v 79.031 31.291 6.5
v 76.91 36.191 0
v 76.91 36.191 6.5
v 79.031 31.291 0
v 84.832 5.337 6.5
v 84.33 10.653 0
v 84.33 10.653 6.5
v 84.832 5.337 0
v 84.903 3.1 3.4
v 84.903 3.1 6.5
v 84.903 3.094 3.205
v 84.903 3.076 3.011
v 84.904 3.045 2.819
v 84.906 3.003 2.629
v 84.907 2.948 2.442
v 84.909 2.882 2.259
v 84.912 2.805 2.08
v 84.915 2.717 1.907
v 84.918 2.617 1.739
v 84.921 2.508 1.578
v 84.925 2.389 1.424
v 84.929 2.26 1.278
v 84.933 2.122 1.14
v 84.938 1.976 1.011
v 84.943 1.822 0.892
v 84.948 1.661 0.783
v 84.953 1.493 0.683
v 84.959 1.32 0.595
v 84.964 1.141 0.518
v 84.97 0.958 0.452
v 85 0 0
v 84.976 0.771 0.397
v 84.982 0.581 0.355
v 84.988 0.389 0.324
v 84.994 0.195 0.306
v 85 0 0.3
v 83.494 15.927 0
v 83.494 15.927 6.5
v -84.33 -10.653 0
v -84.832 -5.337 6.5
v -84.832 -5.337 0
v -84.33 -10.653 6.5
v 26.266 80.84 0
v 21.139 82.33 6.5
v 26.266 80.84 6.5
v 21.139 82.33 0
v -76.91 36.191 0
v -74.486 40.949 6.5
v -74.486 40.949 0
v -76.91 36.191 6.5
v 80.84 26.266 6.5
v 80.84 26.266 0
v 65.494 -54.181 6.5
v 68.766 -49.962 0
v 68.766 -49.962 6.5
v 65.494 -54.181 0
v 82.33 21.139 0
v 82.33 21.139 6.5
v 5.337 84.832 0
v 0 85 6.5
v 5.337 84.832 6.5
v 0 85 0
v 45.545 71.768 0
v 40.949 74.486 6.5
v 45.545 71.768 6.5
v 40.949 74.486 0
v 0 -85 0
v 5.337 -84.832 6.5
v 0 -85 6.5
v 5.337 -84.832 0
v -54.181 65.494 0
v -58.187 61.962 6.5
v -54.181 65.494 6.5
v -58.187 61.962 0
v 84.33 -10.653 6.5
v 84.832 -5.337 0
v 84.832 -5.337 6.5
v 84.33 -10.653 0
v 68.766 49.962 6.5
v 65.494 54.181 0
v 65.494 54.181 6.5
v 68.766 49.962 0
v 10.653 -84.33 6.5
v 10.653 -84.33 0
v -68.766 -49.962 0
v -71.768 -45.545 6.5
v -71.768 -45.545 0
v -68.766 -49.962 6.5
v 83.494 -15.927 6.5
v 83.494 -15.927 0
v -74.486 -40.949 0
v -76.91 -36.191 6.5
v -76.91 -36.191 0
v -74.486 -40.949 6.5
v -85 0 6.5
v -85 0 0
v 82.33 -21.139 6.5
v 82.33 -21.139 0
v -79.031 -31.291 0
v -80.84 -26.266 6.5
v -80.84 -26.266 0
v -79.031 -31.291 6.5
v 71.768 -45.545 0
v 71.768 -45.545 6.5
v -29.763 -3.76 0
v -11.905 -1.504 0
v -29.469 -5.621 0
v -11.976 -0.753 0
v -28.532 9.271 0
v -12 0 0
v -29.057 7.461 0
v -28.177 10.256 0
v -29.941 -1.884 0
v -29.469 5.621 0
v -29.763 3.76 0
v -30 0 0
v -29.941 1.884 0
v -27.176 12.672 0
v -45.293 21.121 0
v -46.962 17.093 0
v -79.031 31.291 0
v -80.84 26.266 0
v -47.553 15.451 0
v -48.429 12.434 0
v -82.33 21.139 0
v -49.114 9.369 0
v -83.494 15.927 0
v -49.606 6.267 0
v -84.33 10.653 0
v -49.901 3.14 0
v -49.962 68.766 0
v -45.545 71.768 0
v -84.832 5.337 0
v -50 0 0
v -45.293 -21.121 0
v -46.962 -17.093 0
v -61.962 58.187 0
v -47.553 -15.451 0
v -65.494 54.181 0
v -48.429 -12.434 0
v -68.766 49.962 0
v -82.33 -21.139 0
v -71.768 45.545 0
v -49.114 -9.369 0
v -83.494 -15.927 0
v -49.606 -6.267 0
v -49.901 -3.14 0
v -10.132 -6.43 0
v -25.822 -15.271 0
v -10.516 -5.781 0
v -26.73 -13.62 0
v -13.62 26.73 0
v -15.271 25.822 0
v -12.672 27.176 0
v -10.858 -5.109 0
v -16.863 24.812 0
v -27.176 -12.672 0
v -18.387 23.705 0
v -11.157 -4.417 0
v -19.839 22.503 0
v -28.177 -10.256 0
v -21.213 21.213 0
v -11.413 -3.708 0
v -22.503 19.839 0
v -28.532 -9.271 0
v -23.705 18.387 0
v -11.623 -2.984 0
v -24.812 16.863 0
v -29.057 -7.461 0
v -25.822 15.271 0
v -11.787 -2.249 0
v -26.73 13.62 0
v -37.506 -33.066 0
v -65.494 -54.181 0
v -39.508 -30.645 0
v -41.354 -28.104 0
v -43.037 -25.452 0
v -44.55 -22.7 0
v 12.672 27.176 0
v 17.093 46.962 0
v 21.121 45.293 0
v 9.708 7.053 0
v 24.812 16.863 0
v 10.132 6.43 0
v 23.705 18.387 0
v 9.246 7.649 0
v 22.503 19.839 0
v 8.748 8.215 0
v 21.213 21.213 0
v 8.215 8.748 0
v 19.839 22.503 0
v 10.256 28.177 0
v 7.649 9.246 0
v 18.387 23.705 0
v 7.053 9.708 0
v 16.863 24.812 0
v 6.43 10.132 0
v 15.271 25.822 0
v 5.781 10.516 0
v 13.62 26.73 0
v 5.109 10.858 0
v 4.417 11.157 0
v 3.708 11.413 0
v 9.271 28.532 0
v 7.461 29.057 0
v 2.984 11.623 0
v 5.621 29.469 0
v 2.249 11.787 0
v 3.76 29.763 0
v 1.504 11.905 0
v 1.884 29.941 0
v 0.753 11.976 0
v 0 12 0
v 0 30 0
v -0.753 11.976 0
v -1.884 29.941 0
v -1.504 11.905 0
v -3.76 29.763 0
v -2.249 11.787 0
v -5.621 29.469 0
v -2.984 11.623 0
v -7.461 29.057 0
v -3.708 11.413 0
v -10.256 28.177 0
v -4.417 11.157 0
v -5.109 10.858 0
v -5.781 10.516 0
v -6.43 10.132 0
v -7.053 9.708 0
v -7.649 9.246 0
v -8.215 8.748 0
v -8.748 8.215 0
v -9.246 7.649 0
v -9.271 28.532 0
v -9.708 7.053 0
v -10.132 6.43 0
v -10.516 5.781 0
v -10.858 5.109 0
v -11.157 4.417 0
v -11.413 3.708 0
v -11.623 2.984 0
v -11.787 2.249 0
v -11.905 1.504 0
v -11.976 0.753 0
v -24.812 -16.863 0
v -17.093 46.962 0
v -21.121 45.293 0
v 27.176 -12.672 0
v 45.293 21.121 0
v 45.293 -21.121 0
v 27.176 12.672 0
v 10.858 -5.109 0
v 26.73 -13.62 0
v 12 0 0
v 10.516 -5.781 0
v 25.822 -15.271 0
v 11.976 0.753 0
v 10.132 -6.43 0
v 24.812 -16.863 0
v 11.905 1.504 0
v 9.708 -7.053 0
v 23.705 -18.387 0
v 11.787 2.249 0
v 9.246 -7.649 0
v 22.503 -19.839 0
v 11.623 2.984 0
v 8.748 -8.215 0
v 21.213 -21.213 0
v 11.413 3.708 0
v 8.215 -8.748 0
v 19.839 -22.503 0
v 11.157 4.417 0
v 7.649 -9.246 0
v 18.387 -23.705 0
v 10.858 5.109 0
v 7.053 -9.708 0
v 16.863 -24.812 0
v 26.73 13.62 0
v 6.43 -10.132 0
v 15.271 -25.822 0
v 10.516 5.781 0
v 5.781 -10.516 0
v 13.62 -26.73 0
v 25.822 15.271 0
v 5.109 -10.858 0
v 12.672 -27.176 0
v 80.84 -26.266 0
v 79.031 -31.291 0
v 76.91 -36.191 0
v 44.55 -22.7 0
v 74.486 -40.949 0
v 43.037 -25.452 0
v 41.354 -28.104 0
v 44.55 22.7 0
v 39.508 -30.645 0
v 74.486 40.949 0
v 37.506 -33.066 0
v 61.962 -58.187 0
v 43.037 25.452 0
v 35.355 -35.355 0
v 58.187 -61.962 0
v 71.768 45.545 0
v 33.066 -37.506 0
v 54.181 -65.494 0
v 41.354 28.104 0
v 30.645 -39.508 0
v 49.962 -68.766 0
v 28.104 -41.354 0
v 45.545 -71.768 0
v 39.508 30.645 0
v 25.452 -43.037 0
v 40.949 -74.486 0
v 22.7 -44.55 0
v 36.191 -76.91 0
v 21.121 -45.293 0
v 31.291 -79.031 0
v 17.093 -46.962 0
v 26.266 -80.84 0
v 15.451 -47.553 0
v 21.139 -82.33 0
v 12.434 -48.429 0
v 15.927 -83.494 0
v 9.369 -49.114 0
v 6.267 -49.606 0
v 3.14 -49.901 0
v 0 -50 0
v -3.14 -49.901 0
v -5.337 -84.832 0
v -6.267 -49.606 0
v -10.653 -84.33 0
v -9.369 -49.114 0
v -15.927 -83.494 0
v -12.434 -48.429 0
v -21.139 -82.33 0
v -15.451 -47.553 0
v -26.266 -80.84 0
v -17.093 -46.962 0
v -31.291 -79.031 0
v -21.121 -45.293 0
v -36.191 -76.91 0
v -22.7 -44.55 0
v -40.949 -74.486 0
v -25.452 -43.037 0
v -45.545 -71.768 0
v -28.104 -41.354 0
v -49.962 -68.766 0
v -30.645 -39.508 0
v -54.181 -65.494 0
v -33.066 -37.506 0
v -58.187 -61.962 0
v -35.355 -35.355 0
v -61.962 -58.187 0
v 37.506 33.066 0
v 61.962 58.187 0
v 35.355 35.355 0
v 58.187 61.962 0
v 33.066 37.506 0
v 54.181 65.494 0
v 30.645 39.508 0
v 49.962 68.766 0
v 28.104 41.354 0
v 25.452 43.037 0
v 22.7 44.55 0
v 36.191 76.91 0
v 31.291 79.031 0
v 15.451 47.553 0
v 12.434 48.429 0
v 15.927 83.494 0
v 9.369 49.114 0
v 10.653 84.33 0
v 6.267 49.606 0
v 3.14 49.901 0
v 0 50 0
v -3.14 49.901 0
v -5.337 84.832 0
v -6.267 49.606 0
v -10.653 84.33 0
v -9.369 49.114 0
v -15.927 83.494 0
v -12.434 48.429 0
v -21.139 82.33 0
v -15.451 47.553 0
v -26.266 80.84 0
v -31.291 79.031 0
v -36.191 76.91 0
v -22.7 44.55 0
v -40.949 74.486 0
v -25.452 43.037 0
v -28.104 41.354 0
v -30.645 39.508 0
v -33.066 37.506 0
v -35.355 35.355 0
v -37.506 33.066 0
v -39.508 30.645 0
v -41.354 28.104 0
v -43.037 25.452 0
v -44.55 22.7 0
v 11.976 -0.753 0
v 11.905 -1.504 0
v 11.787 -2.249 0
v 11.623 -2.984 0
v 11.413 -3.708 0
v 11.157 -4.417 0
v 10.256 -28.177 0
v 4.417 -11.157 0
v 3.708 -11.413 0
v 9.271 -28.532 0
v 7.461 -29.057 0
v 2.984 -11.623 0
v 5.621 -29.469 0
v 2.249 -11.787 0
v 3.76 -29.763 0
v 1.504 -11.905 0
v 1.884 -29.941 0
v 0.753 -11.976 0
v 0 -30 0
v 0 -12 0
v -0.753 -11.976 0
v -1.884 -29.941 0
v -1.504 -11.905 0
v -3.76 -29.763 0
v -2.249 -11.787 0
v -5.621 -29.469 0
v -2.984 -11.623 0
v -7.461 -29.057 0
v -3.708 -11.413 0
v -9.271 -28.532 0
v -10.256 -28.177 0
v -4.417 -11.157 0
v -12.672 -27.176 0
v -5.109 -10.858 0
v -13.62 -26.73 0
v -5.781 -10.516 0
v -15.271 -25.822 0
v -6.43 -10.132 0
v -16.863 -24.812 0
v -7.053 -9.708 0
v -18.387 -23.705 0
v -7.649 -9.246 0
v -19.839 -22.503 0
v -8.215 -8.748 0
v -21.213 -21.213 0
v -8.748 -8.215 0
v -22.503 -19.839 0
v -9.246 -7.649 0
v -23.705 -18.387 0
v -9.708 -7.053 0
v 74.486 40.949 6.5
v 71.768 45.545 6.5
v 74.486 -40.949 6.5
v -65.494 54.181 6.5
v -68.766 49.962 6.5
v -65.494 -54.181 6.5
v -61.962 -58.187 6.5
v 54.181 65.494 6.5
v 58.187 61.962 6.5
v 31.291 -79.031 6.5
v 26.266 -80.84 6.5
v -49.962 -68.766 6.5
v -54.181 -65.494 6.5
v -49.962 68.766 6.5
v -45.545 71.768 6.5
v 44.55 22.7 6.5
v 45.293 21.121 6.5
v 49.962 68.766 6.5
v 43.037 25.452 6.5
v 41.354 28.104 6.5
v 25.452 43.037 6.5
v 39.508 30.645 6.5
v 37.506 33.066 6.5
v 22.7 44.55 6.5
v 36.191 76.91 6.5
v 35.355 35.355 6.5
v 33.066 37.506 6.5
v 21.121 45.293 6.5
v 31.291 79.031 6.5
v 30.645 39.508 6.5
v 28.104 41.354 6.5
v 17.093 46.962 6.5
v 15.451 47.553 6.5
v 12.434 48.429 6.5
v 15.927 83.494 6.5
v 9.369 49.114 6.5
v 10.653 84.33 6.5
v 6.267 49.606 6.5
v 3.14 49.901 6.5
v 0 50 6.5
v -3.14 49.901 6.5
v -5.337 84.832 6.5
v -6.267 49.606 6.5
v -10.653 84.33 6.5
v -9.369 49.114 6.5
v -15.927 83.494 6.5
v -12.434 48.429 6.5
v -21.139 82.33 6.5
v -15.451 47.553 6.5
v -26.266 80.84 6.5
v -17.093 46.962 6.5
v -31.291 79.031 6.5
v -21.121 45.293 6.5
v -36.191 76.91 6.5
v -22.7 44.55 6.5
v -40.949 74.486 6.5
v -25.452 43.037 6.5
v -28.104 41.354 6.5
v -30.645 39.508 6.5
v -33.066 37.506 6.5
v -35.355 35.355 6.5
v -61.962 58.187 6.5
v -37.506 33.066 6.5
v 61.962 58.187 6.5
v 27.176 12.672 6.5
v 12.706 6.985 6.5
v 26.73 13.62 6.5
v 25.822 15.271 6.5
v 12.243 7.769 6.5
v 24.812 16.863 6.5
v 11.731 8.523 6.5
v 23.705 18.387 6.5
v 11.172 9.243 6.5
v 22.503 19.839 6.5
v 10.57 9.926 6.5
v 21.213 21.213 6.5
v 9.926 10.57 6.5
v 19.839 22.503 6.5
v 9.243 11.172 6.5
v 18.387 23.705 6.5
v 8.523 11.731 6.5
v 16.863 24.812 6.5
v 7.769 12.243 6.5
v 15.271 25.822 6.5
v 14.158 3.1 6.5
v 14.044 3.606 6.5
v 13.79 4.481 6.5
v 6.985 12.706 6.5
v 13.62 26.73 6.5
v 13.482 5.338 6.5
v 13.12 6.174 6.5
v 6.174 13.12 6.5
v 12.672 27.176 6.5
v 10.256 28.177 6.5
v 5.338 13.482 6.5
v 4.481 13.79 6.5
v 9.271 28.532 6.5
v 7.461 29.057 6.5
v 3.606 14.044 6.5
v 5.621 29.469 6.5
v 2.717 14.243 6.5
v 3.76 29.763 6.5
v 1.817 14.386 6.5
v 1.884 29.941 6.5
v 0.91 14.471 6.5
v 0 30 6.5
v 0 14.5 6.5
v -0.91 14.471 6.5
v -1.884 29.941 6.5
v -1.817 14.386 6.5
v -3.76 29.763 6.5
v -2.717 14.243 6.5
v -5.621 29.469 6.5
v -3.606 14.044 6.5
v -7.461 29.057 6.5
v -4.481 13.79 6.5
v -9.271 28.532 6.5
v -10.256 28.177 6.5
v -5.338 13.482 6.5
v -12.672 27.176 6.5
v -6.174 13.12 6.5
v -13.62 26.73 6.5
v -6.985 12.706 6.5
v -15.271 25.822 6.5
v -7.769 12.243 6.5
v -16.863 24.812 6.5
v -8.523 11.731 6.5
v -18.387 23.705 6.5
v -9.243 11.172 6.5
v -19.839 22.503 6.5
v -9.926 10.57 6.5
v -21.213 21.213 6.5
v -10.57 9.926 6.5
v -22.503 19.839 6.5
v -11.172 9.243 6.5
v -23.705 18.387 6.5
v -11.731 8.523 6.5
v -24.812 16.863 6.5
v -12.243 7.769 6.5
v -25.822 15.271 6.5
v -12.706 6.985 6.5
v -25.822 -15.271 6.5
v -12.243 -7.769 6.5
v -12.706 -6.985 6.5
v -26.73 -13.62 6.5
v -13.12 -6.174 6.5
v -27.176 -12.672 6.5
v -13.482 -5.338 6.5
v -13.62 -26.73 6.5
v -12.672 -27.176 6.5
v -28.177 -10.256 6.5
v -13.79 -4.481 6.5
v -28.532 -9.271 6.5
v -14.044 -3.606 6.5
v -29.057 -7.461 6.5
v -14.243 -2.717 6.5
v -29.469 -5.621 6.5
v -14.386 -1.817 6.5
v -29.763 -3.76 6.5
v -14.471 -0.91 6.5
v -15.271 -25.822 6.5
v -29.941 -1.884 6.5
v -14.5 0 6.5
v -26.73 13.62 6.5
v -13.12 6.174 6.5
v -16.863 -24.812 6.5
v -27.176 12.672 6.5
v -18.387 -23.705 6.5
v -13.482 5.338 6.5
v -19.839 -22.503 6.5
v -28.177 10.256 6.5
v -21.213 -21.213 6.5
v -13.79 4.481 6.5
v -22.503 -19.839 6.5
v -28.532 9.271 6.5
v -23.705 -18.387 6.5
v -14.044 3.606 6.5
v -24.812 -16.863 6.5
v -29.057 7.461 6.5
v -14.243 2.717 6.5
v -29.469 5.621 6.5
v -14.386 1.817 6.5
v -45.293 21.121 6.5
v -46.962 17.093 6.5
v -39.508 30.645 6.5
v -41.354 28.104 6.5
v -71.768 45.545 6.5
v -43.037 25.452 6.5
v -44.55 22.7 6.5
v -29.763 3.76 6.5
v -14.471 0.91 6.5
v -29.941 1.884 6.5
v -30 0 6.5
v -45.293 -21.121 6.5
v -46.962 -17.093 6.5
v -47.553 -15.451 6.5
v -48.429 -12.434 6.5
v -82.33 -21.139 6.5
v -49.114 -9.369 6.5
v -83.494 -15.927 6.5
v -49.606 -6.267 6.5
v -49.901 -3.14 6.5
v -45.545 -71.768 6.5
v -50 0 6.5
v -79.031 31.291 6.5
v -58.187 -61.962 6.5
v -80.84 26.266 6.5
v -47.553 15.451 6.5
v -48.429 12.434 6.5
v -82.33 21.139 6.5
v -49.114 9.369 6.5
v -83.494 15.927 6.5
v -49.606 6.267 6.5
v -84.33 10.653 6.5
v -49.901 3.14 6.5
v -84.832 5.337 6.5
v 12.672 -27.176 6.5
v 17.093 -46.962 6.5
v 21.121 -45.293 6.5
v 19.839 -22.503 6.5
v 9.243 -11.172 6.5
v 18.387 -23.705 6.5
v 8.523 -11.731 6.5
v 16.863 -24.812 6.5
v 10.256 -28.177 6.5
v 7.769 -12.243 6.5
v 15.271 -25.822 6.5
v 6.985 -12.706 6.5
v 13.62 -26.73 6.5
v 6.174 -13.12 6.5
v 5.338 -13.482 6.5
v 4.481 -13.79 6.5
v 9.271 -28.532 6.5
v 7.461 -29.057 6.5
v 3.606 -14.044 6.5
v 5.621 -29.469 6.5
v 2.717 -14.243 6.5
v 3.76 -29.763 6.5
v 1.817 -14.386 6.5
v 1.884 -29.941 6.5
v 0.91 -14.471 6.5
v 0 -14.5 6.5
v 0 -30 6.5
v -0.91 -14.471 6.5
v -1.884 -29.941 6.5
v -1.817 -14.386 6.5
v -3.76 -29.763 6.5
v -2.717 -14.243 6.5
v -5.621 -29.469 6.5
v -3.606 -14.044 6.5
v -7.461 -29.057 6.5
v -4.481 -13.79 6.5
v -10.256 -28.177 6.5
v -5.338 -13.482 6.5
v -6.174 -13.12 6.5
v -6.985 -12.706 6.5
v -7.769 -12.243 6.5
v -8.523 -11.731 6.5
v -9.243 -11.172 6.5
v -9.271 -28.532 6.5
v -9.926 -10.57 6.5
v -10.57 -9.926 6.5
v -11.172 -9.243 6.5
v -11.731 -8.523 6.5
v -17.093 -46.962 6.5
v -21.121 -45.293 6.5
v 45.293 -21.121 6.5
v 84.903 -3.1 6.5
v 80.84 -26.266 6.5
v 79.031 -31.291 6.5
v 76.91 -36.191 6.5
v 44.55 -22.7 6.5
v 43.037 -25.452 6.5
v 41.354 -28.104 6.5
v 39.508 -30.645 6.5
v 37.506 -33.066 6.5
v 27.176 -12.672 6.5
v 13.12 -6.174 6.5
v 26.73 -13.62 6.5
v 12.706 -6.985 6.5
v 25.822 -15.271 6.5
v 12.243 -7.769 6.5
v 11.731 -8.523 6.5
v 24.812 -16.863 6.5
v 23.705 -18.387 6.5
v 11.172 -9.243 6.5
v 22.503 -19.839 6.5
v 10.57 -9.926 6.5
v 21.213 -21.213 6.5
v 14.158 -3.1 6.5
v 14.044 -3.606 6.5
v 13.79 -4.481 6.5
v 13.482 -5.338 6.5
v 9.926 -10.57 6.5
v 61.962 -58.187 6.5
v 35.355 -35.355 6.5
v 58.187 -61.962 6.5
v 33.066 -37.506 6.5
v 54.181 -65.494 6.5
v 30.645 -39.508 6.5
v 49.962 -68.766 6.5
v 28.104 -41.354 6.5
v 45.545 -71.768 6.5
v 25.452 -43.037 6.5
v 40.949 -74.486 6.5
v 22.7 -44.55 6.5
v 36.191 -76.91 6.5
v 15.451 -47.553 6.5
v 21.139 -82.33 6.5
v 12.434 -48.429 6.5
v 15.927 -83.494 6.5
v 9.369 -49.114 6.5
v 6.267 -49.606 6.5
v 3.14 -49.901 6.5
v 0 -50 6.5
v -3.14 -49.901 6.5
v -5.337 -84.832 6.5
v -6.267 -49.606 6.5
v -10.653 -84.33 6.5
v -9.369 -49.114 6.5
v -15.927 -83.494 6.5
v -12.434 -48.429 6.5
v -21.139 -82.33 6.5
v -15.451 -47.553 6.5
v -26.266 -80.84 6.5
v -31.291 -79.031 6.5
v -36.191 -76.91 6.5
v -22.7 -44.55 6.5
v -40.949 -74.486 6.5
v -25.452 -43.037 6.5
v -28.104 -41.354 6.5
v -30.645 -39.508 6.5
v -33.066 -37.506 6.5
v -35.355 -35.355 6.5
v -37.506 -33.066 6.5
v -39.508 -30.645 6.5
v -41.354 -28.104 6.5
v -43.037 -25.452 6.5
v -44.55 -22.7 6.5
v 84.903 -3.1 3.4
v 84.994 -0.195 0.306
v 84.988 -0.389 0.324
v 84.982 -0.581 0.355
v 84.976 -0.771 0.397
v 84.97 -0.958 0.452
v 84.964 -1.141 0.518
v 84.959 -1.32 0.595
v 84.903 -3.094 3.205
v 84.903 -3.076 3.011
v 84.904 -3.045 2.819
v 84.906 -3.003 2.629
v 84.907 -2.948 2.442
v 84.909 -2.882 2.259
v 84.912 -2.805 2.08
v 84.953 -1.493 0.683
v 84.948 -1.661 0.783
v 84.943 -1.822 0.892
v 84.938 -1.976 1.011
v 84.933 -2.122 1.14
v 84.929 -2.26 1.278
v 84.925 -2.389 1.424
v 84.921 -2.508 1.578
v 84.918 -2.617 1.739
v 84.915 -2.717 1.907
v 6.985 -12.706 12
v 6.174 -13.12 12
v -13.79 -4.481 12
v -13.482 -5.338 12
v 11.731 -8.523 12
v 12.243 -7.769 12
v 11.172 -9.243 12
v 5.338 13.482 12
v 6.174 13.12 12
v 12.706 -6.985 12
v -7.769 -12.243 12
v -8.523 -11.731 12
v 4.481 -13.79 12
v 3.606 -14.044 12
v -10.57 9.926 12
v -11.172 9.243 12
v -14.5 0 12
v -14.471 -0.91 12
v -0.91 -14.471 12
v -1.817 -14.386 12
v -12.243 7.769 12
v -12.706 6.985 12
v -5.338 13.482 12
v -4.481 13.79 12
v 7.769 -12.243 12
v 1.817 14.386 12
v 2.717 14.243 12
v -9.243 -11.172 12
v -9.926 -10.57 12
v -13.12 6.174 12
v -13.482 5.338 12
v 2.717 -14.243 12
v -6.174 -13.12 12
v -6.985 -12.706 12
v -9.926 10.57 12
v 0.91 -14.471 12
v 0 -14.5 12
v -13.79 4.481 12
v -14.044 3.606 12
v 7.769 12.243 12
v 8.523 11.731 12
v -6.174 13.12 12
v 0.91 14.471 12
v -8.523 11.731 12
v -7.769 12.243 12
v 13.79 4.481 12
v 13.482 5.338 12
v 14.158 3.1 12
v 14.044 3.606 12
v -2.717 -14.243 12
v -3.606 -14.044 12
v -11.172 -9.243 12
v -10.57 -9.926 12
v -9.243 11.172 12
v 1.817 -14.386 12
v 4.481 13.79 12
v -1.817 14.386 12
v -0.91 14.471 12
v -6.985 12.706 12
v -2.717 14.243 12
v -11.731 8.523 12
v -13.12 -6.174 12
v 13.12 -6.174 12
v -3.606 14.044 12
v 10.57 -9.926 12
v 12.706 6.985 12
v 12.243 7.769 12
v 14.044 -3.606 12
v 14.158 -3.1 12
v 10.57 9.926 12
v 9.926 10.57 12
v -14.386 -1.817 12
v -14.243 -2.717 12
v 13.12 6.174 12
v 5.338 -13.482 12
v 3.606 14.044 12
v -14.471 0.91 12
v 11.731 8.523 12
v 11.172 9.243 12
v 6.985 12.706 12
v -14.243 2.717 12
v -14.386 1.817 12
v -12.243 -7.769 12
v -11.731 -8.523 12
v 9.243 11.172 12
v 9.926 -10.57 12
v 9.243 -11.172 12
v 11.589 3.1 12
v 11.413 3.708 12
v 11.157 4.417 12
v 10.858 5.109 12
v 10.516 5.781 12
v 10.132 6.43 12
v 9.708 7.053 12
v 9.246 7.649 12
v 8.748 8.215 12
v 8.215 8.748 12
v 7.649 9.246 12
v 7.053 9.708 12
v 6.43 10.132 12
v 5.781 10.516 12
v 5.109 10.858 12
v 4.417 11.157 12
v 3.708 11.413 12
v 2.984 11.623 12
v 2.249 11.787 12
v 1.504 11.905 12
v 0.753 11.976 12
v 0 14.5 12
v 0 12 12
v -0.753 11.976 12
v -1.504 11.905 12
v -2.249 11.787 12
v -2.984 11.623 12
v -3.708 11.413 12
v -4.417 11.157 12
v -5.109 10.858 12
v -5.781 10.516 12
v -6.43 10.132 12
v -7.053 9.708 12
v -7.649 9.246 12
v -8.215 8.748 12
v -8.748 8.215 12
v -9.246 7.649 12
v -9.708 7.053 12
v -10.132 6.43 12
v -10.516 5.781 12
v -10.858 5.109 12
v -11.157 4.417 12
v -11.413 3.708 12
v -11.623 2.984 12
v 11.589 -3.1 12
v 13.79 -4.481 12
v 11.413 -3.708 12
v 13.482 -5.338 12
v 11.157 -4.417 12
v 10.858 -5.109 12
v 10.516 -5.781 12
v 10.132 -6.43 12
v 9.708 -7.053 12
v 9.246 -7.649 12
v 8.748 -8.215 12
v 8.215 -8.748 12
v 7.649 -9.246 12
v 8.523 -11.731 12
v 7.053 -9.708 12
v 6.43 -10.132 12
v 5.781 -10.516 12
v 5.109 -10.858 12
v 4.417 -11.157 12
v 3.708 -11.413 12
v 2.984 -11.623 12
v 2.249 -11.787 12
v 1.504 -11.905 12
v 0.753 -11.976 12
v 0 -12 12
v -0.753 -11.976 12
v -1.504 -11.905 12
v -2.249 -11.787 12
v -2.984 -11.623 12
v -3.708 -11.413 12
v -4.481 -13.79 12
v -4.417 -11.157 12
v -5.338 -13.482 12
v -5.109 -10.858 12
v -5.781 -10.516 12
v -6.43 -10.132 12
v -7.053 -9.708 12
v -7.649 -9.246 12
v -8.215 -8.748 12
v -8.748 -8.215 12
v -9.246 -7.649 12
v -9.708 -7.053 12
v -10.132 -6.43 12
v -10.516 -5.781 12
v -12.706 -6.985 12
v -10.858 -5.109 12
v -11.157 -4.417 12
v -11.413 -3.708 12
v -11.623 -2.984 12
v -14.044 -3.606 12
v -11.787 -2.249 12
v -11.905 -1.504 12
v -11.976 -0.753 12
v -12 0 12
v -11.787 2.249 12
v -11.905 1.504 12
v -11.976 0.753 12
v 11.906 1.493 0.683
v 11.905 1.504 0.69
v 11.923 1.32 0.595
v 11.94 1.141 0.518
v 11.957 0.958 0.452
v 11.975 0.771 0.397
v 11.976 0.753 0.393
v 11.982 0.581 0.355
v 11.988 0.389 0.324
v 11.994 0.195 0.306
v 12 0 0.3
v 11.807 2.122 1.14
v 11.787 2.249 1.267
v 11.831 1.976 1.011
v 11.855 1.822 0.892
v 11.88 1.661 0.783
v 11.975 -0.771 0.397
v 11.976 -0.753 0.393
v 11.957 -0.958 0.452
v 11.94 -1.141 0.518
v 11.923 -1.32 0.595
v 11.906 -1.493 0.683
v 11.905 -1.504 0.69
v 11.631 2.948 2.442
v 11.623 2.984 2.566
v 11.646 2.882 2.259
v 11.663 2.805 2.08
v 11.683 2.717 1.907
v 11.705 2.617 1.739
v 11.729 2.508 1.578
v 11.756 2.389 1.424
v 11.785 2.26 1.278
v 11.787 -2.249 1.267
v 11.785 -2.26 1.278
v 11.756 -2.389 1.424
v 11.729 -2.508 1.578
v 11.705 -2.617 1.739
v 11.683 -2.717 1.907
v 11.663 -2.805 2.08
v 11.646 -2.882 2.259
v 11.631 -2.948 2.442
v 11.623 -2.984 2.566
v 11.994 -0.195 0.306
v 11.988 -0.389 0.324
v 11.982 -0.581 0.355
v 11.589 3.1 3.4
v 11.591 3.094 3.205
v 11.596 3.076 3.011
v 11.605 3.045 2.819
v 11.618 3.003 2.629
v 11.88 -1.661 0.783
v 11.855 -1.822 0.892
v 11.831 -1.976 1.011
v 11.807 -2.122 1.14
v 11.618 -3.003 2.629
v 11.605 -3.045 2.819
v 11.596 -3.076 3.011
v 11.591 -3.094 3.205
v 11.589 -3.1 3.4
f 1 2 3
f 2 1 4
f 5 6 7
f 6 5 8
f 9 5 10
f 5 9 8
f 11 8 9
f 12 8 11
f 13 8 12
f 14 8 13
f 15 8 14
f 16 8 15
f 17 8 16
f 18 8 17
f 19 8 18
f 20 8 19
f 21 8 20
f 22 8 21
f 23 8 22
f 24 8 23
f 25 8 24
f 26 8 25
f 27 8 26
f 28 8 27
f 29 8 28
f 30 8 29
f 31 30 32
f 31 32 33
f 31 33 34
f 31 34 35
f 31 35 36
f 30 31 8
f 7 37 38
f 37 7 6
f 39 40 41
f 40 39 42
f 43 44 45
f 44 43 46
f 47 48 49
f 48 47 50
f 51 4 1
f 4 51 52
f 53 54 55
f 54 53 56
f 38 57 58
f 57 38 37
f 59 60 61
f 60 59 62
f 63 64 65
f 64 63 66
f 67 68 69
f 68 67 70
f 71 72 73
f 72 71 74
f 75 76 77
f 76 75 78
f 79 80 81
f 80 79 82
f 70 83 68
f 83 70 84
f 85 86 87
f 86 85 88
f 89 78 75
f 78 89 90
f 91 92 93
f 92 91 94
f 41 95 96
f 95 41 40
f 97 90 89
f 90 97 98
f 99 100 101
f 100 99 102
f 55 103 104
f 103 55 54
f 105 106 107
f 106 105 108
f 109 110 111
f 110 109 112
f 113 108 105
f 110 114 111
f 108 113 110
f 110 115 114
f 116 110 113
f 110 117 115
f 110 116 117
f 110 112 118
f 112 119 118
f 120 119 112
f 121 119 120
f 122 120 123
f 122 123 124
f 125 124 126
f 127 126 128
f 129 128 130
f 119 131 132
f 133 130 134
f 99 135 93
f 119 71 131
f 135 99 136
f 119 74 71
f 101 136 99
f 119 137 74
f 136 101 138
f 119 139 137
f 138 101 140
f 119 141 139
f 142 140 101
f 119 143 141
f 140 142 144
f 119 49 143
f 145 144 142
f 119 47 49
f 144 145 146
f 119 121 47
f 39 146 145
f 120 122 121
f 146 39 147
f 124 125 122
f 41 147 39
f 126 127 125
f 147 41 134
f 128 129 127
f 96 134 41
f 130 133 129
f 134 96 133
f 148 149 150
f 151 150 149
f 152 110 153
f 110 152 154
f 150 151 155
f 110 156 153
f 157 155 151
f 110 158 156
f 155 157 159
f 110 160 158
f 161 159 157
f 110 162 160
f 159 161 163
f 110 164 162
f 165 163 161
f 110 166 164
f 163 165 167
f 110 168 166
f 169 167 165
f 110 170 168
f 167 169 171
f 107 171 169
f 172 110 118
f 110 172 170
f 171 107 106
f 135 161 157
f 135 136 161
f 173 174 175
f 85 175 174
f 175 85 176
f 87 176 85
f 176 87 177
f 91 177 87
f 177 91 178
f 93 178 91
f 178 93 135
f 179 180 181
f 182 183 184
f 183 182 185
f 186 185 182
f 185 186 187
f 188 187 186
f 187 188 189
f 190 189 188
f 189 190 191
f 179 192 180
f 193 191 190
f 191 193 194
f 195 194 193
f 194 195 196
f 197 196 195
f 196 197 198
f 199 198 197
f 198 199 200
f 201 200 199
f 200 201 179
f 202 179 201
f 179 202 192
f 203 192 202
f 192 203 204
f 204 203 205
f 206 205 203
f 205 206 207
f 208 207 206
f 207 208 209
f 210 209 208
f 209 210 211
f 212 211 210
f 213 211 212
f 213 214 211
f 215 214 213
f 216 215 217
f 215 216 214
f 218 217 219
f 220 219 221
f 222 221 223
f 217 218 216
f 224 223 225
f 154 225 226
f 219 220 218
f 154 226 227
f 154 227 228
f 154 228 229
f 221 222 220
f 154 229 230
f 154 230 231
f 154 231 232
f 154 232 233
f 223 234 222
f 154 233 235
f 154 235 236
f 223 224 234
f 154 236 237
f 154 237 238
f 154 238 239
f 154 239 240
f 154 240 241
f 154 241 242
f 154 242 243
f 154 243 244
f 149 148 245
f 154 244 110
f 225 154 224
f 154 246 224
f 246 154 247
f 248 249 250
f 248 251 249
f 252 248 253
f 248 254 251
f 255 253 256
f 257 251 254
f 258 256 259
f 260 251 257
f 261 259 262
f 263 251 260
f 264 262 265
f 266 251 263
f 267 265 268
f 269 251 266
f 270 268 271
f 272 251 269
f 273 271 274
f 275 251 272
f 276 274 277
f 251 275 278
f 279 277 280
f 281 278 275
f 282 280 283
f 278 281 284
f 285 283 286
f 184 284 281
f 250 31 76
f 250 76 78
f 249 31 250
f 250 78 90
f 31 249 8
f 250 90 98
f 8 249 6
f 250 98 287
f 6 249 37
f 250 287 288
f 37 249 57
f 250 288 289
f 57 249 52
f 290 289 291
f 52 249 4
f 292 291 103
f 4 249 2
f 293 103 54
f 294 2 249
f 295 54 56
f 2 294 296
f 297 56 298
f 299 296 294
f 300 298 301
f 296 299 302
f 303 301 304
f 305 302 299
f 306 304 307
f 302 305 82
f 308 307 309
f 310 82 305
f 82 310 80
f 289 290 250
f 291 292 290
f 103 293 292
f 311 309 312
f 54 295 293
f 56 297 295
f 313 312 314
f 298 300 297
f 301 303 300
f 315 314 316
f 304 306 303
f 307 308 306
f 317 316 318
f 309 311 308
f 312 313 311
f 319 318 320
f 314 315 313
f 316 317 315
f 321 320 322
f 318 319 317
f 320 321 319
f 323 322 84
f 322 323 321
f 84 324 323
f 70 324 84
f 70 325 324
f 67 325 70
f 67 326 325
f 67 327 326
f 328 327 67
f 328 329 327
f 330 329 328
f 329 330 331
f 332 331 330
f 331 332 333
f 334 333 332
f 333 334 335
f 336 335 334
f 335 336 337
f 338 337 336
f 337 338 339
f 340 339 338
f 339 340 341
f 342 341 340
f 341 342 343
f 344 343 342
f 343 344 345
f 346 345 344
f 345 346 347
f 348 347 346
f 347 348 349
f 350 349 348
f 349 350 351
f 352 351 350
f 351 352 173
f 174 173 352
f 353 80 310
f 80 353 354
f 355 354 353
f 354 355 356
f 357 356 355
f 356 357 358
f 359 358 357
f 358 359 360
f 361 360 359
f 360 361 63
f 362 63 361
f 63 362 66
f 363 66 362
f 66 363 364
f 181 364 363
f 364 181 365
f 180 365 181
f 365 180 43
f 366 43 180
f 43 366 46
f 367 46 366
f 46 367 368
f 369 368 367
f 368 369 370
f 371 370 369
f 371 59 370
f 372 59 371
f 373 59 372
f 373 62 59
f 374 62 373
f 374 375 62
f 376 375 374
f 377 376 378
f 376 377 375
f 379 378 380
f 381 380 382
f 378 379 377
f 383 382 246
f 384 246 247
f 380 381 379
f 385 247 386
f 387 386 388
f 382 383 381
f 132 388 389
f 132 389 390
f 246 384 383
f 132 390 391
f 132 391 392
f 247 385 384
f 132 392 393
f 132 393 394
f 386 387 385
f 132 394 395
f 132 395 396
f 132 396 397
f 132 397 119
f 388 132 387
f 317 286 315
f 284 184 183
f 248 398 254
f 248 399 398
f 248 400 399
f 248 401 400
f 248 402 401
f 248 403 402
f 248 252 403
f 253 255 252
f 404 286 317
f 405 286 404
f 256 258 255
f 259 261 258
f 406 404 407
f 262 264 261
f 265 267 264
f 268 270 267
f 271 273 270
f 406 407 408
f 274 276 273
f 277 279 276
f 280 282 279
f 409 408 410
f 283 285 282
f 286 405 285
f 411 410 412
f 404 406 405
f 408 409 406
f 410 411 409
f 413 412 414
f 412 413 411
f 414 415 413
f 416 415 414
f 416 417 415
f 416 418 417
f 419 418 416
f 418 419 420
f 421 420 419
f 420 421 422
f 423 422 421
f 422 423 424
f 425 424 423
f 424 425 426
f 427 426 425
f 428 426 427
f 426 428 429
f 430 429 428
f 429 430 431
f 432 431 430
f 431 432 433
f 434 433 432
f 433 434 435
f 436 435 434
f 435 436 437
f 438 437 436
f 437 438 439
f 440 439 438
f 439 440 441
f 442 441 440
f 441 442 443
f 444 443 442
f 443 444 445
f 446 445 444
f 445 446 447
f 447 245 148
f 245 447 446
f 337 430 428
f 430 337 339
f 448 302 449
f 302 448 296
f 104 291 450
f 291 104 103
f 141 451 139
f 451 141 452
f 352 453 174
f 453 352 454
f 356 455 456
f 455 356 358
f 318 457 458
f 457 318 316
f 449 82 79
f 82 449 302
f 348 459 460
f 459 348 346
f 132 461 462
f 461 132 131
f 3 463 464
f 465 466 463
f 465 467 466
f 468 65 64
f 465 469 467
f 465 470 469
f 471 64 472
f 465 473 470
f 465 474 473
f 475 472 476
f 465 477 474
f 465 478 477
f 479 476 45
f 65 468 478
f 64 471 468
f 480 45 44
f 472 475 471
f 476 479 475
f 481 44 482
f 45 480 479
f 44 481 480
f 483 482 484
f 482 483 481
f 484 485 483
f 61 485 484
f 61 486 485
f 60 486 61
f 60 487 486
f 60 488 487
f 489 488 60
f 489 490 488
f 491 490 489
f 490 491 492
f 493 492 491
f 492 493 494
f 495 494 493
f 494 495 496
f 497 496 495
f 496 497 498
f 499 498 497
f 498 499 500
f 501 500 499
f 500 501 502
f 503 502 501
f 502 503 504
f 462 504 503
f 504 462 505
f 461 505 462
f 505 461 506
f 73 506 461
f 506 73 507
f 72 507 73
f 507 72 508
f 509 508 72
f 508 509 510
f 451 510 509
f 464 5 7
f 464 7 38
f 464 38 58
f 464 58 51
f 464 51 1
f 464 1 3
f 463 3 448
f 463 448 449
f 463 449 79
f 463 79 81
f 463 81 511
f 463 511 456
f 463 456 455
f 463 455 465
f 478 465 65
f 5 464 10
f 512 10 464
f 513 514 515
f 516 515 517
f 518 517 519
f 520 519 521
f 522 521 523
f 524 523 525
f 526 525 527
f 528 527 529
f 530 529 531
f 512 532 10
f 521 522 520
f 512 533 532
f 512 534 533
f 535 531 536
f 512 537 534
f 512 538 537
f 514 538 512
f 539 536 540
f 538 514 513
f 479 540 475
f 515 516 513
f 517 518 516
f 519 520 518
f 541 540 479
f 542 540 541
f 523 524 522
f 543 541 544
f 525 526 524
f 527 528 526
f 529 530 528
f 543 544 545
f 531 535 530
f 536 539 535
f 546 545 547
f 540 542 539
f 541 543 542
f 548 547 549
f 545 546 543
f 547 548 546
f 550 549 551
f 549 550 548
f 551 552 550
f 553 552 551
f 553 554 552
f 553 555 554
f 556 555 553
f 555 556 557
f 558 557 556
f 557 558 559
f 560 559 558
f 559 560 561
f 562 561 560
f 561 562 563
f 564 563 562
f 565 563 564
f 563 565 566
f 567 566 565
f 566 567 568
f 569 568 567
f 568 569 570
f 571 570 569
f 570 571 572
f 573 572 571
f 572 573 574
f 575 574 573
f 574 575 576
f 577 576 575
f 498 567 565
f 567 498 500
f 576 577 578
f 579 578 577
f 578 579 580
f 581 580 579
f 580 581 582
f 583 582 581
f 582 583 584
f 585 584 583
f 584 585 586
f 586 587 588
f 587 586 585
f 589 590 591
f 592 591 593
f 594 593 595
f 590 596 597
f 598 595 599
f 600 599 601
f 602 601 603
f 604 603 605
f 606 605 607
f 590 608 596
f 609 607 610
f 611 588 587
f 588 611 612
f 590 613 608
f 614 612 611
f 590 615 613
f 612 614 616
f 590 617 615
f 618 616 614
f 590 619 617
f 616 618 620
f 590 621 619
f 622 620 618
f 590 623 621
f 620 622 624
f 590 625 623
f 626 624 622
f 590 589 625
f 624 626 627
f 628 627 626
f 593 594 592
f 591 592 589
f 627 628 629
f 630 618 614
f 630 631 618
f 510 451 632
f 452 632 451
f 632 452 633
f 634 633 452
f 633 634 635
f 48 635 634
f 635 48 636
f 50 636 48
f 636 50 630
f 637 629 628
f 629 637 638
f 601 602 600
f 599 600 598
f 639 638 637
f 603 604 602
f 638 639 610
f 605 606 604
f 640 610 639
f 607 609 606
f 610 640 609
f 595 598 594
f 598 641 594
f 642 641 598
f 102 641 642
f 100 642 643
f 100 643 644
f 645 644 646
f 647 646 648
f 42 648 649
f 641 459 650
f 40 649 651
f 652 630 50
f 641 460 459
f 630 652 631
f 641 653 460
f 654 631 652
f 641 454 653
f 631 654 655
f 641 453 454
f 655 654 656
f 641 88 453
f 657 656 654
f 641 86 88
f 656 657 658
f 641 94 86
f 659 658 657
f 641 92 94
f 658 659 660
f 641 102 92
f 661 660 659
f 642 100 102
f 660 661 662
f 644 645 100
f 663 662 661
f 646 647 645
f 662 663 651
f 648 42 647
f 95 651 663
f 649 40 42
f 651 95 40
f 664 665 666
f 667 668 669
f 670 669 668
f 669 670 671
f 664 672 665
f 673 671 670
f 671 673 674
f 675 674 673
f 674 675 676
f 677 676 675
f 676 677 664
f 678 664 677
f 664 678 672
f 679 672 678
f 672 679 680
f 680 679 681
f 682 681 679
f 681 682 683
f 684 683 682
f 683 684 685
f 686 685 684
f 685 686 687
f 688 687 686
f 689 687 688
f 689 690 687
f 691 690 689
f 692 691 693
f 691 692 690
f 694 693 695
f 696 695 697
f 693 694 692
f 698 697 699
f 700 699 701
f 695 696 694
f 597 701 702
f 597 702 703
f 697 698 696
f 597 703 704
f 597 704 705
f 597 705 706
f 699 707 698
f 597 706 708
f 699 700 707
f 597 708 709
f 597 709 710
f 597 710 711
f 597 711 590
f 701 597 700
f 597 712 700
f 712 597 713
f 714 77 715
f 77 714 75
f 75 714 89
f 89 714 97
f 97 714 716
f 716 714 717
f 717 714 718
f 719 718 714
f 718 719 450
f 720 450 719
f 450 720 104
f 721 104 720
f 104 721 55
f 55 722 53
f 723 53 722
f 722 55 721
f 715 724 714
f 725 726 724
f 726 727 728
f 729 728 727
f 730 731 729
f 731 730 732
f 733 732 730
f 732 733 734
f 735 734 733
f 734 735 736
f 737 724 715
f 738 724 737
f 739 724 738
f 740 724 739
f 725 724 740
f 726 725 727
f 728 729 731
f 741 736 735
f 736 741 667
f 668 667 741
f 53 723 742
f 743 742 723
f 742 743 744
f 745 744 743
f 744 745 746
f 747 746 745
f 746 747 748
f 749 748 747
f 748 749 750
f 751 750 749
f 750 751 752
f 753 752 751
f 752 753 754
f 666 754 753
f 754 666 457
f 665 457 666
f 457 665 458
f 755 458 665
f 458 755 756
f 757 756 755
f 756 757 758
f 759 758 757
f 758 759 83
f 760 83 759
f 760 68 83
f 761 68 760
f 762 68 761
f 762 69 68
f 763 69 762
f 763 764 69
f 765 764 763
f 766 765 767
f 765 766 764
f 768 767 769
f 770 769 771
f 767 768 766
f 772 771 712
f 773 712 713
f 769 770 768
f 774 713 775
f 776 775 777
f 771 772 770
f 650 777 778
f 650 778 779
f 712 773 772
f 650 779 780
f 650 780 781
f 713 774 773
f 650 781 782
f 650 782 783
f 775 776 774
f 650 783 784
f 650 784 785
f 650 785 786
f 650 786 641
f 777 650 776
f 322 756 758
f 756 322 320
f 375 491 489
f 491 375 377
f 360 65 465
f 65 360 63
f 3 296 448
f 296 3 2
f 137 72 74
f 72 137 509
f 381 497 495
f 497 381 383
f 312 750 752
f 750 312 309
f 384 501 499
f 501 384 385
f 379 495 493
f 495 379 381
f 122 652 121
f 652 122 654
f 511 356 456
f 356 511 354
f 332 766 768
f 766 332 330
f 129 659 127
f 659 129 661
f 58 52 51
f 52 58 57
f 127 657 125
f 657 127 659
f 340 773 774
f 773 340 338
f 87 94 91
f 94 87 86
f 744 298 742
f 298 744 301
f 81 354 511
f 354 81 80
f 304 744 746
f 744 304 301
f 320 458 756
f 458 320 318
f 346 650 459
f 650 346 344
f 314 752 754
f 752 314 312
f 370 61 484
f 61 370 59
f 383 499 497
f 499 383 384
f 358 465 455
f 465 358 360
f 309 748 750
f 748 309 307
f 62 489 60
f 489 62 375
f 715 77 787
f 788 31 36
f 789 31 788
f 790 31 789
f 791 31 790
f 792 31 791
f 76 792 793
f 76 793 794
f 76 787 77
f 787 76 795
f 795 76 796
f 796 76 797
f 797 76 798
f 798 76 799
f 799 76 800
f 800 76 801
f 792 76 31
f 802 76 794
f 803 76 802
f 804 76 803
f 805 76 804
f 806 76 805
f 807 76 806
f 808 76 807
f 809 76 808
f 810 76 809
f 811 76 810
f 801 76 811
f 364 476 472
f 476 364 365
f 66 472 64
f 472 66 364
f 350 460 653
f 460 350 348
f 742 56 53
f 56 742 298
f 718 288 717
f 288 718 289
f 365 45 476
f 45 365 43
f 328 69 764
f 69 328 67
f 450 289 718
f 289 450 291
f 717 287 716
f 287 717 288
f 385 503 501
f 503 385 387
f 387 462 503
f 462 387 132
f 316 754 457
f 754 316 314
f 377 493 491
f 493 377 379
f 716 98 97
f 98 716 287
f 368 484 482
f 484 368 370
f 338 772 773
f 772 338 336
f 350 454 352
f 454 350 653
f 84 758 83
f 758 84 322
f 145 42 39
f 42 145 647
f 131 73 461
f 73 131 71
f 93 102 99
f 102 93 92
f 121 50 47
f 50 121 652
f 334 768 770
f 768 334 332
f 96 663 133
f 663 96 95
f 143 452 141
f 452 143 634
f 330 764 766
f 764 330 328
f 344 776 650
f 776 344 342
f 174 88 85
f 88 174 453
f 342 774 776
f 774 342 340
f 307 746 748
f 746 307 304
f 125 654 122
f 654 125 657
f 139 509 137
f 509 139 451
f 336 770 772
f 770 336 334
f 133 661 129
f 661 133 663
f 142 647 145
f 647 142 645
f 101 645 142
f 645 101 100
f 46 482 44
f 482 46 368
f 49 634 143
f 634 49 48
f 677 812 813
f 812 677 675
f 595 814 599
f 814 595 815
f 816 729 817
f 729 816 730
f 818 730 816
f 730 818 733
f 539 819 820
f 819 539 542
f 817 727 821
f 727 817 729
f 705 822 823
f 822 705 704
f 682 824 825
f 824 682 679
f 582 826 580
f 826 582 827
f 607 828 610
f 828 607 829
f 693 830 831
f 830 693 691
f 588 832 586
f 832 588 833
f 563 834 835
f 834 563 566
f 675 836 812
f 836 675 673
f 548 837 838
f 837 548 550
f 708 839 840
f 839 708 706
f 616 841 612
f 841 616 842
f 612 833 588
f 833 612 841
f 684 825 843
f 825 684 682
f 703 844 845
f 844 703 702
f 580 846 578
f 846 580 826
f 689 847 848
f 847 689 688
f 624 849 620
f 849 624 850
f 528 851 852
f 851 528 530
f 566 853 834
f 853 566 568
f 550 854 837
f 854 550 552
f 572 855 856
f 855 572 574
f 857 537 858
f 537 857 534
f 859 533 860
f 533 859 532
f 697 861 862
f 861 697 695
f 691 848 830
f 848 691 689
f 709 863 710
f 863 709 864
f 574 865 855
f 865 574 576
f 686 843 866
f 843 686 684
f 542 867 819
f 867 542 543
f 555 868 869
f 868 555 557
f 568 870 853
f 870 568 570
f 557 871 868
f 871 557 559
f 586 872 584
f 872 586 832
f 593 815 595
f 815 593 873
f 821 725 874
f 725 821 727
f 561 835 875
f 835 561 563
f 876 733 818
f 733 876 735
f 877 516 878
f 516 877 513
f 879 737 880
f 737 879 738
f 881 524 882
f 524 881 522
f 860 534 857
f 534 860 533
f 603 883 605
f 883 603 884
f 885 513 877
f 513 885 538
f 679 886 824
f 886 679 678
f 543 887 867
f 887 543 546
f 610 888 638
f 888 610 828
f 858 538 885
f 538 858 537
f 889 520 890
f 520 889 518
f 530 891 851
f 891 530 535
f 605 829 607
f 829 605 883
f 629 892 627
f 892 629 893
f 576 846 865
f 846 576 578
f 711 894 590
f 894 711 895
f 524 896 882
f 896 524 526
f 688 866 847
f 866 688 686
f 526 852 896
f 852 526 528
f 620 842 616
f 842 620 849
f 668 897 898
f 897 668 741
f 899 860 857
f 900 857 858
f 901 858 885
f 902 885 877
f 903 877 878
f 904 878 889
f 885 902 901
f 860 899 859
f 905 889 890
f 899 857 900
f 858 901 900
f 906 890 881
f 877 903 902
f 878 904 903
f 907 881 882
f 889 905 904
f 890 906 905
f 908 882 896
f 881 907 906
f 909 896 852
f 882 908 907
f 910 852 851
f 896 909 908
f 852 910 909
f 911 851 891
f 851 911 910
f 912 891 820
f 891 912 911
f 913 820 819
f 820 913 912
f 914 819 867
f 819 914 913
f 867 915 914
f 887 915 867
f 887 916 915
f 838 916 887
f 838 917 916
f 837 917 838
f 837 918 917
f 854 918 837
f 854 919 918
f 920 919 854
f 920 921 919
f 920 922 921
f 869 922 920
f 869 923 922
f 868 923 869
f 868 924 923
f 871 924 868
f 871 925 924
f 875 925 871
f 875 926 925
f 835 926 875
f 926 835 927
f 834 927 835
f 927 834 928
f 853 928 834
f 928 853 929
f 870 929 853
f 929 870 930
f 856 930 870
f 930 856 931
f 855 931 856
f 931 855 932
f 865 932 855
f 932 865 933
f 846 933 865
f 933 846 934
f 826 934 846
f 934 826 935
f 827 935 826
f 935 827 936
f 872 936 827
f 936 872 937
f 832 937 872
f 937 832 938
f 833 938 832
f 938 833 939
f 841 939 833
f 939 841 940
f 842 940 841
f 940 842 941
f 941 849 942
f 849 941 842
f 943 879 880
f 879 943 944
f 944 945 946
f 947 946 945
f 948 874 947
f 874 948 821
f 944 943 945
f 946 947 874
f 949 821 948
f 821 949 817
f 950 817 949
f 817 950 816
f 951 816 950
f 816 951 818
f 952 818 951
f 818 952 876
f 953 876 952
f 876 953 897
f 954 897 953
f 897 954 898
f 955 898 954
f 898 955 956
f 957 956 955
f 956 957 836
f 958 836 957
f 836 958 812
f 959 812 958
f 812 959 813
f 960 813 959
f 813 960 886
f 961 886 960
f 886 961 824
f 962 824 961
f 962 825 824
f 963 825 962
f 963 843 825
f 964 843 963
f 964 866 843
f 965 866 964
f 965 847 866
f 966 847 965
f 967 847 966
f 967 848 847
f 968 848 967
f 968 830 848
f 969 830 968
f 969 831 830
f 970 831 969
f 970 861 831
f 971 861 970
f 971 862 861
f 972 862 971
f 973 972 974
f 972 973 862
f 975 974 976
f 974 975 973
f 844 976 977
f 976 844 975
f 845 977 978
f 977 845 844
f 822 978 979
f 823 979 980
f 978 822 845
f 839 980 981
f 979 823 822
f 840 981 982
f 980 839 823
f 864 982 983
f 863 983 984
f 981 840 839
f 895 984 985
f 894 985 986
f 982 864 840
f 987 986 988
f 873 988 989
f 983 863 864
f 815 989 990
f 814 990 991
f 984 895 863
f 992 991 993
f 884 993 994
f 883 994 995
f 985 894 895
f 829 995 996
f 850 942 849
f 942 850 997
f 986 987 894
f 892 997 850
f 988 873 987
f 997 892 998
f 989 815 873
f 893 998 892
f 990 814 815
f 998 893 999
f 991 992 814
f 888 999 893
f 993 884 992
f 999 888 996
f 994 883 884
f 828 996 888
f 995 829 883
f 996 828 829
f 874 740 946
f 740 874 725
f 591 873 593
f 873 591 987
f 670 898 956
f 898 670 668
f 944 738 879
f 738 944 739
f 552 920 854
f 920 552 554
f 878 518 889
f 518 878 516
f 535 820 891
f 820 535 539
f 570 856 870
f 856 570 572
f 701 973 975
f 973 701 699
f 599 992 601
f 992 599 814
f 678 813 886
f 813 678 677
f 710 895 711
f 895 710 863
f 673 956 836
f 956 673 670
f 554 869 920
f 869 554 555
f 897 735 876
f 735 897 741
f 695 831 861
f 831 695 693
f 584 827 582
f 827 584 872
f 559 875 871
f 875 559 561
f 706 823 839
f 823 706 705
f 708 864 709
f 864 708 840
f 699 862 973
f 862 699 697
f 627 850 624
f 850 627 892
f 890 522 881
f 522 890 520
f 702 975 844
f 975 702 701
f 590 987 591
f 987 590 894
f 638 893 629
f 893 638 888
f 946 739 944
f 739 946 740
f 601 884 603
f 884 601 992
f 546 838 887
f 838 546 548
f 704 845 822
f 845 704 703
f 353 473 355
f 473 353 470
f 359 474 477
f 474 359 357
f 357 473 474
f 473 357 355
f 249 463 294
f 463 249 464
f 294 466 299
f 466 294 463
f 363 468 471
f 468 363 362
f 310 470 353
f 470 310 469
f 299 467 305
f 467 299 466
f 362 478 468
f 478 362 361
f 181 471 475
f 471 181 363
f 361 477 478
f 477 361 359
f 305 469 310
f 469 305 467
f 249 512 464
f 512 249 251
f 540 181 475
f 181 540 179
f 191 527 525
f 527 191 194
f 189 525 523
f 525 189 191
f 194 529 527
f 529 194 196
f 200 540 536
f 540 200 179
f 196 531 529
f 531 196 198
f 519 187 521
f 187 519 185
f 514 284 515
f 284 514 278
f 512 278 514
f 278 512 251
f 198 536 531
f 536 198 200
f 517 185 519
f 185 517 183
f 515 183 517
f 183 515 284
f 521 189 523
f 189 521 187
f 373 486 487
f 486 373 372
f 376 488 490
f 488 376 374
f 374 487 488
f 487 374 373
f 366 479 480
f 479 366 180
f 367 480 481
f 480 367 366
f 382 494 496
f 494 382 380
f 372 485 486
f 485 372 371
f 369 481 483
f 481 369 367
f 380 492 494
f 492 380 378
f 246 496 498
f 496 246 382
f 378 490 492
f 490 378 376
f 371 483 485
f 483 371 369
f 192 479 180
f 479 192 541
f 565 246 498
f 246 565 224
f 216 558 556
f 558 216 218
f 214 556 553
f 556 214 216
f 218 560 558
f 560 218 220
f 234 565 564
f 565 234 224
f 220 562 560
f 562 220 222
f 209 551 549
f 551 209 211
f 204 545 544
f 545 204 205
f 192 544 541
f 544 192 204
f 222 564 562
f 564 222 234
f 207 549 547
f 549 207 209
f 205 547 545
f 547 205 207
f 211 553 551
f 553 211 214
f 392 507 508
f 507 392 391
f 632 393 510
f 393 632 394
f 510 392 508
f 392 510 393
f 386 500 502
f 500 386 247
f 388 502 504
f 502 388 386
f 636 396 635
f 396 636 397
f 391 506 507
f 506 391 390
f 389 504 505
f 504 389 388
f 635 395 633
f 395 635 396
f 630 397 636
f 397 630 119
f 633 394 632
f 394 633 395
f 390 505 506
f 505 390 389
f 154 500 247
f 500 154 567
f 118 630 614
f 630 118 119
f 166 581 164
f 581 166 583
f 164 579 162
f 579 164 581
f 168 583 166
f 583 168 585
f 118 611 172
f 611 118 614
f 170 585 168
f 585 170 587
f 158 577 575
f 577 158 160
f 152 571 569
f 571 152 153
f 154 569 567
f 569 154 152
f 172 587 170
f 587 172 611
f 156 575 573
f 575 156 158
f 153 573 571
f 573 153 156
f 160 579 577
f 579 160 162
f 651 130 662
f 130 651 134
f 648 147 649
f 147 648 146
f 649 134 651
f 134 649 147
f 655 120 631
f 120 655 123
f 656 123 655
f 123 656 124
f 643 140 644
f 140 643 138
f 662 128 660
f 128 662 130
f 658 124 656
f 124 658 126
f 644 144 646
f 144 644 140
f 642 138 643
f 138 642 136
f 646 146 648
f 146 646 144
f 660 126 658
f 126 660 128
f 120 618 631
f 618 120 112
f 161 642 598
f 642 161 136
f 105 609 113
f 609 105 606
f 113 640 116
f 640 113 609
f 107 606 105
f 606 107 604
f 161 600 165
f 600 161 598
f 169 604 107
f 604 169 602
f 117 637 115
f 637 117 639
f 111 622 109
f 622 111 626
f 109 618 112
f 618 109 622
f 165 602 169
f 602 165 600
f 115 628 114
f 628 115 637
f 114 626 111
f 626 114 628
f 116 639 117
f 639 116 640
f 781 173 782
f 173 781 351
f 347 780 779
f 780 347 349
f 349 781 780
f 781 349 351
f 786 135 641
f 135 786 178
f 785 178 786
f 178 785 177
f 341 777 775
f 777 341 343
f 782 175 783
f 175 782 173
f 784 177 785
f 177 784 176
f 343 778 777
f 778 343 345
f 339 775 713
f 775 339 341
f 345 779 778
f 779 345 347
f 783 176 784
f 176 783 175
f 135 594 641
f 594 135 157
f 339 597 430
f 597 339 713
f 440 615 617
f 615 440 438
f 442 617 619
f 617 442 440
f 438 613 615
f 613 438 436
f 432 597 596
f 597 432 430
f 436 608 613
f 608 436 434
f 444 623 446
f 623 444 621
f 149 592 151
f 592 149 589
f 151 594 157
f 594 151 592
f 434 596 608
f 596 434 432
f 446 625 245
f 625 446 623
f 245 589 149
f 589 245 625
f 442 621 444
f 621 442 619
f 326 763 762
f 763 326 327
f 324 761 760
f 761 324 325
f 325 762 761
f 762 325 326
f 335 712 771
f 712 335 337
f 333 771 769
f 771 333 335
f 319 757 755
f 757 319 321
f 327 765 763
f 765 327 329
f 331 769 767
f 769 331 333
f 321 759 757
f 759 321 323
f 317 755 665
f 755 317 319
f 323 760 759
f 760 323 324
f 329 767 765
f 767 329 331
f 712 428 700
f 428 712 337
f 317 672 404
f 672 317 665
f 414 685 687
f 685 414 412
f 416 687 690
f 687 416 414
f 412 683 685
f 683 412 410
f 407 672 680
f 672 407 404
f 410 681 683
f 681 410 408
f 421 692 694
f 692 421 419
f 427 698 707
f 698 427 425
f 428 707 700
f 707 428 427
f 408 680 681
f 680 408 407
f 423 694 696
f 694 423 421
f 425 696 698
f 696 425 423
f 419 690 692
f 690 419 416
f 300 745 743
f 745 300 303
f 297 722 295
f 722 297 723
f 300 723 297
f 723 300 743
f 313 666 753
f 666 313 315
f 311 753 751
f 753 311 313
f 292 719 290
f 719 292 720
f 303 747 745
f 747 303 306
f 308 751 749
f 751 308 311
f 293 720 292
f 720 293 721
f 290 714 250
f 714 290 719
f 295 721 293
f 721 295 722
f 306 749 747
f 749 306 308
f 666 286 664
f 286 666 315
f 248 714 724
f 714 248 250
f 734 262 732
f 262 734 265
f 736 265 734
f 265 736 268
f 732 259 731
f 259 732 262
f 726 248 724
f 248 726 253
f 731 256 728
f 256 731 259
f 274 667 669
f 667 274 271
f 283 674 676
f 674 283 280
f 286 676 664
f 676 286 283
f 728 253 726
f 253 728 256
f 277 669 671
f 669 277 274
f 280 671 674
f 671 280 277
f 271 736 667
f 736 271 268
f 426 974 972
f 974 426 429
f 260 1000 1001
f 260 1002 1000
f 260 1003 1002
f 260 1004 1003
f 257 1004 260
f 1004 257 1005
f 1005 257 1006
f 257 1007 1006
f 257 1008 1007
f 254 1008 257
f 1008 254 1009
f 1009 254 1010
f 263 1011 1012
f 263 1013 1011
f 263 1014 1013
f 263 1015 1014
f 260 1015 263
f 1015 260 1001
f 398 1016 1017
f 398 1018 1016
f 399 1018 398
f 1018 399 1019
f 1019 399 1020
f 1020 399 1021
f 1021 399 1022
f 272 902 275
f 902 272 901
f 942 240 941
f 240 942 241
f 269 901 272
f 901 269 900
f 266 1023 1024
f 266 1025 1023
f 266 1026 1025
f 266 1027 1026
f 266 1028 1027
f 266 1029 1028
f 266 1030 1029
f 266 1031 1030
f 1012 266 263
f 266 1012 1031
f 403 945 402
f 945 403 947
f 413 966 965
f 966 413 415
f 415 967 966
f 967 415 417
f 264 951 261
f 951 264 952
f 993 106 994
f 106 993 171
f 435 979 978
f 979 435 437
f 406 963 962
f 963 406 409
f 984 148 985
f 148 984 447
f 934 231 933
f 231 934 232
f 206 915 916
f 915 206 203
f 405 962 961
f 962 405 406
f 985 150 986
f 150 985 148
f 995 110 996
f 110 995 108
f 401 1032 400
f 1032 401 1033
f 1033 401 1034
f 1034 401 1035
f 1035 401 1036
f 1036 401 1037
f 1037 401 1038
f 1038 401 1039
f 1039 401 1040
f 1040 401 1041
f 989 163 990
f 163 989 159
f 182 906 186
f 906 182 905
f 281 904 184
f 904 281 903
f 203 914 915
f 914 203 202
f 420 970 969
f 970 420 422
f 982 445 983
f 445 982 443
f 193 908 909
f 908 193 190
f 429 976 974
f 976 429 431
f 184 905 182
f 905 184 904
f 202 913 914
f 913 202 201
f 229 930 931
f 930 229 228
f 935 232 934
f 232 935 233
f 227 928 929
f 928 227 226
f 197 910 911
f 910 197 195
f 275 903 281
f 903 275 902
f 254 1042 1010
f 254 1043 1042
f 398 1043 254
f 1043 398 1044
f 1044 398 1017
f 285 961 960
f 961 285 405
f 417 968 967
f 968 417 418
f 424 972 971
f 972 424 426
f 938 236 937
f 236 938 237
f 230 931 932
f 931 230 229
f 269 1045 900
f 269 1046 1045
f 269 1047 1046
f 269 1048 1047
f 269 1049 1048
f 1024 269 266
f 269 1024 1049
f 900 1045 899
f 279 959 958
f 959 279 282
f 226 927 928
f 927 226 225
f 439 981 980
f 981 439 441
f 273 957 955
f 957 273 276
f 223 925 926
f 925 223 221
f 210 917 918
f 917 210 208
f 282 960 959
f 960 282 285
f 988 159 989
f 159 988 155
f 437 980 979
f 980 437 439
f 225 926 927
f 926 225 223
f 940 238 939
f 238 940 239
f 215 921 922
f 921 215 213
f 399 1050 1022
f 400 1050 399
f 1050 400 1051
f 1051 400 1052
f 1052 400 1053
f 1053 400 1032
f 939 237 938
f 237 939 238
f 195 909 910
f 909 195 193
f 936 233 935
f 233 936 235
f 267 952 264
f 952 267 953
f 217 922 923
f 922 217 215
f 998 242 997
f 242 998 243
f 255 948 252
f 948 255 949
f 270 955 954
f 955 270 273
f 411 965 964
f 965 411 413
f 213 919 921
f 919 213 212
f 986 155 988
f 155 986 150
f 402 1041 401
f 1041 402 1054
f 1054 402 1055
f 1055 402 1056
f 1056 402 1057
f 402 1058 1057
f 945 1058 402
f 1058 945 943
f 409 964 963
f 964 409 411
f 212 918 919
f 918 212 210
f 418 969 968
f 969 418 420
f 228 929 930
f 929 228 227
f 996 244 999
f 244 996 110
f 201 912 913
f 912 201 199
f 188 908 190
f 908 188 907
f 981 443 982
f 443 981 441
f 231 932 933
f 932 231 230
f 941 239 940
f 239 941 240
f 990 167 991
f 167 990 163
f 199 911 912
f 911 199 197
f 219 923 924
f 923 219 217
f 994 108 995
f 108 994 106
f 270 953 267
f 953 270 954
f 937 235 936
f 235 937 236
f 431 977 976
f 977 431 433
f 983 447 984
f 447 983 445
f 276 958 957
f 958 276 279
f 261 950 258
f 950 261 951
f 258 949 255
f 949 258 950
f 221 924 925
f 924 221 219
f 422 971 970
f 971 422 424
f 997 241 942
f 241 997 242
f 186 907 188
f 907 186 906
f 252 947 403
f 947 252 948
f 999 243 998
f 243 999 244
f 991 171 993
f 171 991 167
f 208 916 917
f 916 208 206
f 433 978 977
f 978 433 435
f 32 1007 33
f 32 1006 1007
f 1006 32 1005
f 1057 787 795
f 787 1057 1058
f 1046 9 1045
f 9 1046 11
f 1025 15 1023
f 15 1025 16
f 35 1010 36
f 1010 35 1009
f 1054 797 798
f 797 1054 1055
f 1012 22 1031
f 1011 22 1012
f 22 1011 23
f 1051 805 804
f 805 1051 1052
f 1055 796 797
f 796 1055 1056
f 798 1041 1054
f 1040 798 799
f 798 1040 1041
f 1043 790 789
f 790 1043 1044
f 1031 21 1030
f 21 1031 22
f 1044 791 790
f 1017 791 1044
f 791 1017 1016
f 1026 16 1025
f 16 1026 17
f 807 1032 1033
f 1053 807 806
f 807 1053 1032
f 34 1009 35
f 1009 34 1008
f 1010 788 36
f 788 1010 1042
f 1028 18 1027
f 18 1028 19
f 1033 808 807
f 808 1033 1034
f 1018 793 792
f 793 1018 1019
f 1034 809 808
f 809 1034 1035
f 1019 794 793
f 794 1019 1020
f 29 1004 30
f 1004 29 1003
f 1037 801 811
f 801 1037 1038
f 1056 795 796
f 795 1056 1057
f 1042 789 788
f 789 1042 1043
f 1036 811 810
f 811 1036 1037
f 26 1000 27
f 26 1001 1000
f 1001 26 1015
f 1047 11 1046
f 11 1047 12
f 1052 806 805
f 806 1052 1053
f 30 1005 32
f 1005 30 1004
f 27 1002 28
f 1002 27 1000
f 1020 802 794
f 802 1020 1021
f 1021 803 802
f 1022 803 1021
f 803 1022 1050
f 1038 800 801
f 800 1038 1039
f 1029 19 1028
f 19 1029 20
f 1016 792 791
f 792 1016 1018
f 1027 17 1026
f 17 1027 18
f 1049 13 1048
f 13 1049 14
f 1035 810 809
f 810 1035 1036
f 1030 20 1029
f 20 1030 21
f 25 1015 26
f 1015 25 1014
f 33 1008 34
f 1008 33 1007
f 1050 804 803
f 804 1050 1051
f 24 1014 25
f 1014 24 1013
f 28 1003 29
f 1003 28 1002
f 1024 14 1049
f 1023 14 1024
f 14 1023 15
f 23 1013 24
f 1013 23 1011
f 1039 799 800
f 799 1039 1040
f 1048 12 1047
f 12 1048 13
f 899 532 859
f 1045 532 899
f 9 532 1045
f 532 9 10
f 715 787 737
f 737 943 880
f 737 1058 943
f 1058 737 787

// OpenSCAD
$fn = 100;

difference() {
  union() {
    cylinder(h = 6.5, r = 85, center = false);
    cylinder(h = 12, r = 14.5, center = false);
  }
  
  translate([0, 0, -1])
    cylinder(h = 40, r = 12, center = false);

  translate([0, 0, 3.4]) 
    rotate([0, 90, 0])
      cylinder(h = 90, r = 3.1, center = false);
  
  translate([0, -3.1, 3.4])
    cube([100, 6.2, 10]);
  
  
  rotate([0, 0, 45])
    translate([0, 0, -1])
      gap();
  
  rotate([0, 0, 90])
    translate([0, 0, -1])
      gap();

  rotate([0, 0, 135])
    translate([0, 0, -1])
      gap();

  rotate([0, 0, 180])
    translate([0, 0, -1])
      gap();

  rotate([0, 0, 225])
    translate([0, 0, -1])
      gap();

  rotate([0, 0, 270])
    translate([0, 0, -1])
      gap();
      
  rotate([0, 0, 315])
    translate([0, 0, -1])
      gap();
}

module slice(angle = 20, r = 90)
  linear_extrude(10)
    polygon([
      [0, 0], 
      [r * cos(angle),  r * sin(angle)], 
      [r * cos(angle), -r * sin(angle)]
    ]);


module gap() {
  difference() {
    intersection() {
      
      cylinder(h = 10, r = 50, center = false);
      
      slice();
    }
    
    translate([0, 0, -1])
      cylinder(h = 12, r = 30, center = false);
    
  }
}
